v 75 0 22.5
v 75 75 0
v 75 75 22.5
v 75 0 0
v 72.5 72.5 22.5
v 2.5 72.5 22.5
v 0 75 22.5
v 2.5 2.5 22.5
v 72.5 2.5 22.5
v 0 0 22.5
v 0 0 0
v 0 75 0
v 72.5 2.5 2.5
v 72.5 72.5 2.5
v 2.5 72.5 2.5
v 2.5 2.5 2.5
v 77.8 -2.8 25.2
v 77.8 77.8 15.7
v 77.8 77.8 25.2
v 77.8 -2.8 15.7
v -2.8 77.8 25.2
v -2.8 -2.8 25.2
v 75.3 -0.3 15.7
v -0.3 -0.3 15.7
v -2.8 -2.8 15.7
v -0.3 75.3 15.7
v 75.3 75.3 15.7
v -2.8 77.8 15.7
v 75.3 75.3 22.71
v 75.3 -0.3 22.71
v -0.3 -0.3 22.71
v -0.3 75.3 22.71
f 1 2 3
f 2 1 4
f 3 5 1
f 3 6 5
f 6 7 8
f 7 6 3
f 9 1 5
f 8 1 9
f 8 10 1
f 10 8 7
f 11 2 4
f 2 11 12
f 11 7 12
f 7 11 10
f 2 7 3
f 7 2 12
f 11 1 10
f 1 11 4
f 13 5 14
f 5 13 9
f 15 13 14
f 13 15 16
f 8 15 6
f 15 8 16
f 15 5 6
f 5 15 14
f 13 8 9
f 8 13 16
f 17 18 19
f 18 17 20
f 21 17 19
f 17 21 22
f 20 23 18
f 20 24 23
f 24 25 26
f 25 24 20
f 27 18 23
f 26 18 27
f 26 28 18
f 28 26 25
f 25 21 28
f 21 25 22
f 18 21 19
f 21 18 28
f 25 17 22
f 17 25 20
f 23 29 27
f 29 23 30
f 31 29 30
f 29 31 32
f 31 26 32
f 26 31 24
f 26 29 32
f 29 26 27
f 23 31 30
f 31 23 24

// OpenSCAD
$fn = 48;

// Internal cavity requirements
inner_x = 70;
inner_y = 70;
inner_z = 20;

// Base geometry
wall = 2.5;
floor_thickness = 2.5;

// Lid geometry
fit_clearance = 0.30;   // nominal radial clearance per side for FDM fit
lid_wall = 2.5;
lid_top = 2.5;
lid_skirt_depth = 7.0;

// Display / assembly
visual_gap = 0.20;      // small gap so the two solids do not intersect in preview

base_outer_x = inner_x + 2 * wall;
base_outer_y = inner_y + 2 * wall;
base_outer_z = inner_z + floor_thickness;

lid_inner_x = base_outer_x + 2 * fit_clearance;
lid_inner_y = base_outer_y + 2 * fit_clearance;
lid_outer_x = lid_inner_x + 2 * lid_wall;
lid_outer_y = lid_inner_y + 2 * lid_wall;
lid_total_z = lid_top + lid_skirt_depth;

module base_part() {
    difference() {
        cube([base_outer_x, base_outer_y, base_outer_z]);
        translate([wall, wall, floor_thickness])
            cube([inner_x, inner_y, inner_z + 0.01]);
    }
}

module lid_part() {
    difference() {
        cube([lid_outer_x, lid_outer_y, lid_total_z]);
        translate([lid_wall, lid_wall, 0])
            cube([lid_inner_x, lid_inner_y, lid_skirt_depth + 0.01]);
    }
}

base_part();

translate([
    -(lid_outer_x - base_outer_x) / 2,
    -(lid_outer_y - base_outer_y) / 2,
    base_outer_z - lid_skirt_depth + visual_gap
])
lid_part();
